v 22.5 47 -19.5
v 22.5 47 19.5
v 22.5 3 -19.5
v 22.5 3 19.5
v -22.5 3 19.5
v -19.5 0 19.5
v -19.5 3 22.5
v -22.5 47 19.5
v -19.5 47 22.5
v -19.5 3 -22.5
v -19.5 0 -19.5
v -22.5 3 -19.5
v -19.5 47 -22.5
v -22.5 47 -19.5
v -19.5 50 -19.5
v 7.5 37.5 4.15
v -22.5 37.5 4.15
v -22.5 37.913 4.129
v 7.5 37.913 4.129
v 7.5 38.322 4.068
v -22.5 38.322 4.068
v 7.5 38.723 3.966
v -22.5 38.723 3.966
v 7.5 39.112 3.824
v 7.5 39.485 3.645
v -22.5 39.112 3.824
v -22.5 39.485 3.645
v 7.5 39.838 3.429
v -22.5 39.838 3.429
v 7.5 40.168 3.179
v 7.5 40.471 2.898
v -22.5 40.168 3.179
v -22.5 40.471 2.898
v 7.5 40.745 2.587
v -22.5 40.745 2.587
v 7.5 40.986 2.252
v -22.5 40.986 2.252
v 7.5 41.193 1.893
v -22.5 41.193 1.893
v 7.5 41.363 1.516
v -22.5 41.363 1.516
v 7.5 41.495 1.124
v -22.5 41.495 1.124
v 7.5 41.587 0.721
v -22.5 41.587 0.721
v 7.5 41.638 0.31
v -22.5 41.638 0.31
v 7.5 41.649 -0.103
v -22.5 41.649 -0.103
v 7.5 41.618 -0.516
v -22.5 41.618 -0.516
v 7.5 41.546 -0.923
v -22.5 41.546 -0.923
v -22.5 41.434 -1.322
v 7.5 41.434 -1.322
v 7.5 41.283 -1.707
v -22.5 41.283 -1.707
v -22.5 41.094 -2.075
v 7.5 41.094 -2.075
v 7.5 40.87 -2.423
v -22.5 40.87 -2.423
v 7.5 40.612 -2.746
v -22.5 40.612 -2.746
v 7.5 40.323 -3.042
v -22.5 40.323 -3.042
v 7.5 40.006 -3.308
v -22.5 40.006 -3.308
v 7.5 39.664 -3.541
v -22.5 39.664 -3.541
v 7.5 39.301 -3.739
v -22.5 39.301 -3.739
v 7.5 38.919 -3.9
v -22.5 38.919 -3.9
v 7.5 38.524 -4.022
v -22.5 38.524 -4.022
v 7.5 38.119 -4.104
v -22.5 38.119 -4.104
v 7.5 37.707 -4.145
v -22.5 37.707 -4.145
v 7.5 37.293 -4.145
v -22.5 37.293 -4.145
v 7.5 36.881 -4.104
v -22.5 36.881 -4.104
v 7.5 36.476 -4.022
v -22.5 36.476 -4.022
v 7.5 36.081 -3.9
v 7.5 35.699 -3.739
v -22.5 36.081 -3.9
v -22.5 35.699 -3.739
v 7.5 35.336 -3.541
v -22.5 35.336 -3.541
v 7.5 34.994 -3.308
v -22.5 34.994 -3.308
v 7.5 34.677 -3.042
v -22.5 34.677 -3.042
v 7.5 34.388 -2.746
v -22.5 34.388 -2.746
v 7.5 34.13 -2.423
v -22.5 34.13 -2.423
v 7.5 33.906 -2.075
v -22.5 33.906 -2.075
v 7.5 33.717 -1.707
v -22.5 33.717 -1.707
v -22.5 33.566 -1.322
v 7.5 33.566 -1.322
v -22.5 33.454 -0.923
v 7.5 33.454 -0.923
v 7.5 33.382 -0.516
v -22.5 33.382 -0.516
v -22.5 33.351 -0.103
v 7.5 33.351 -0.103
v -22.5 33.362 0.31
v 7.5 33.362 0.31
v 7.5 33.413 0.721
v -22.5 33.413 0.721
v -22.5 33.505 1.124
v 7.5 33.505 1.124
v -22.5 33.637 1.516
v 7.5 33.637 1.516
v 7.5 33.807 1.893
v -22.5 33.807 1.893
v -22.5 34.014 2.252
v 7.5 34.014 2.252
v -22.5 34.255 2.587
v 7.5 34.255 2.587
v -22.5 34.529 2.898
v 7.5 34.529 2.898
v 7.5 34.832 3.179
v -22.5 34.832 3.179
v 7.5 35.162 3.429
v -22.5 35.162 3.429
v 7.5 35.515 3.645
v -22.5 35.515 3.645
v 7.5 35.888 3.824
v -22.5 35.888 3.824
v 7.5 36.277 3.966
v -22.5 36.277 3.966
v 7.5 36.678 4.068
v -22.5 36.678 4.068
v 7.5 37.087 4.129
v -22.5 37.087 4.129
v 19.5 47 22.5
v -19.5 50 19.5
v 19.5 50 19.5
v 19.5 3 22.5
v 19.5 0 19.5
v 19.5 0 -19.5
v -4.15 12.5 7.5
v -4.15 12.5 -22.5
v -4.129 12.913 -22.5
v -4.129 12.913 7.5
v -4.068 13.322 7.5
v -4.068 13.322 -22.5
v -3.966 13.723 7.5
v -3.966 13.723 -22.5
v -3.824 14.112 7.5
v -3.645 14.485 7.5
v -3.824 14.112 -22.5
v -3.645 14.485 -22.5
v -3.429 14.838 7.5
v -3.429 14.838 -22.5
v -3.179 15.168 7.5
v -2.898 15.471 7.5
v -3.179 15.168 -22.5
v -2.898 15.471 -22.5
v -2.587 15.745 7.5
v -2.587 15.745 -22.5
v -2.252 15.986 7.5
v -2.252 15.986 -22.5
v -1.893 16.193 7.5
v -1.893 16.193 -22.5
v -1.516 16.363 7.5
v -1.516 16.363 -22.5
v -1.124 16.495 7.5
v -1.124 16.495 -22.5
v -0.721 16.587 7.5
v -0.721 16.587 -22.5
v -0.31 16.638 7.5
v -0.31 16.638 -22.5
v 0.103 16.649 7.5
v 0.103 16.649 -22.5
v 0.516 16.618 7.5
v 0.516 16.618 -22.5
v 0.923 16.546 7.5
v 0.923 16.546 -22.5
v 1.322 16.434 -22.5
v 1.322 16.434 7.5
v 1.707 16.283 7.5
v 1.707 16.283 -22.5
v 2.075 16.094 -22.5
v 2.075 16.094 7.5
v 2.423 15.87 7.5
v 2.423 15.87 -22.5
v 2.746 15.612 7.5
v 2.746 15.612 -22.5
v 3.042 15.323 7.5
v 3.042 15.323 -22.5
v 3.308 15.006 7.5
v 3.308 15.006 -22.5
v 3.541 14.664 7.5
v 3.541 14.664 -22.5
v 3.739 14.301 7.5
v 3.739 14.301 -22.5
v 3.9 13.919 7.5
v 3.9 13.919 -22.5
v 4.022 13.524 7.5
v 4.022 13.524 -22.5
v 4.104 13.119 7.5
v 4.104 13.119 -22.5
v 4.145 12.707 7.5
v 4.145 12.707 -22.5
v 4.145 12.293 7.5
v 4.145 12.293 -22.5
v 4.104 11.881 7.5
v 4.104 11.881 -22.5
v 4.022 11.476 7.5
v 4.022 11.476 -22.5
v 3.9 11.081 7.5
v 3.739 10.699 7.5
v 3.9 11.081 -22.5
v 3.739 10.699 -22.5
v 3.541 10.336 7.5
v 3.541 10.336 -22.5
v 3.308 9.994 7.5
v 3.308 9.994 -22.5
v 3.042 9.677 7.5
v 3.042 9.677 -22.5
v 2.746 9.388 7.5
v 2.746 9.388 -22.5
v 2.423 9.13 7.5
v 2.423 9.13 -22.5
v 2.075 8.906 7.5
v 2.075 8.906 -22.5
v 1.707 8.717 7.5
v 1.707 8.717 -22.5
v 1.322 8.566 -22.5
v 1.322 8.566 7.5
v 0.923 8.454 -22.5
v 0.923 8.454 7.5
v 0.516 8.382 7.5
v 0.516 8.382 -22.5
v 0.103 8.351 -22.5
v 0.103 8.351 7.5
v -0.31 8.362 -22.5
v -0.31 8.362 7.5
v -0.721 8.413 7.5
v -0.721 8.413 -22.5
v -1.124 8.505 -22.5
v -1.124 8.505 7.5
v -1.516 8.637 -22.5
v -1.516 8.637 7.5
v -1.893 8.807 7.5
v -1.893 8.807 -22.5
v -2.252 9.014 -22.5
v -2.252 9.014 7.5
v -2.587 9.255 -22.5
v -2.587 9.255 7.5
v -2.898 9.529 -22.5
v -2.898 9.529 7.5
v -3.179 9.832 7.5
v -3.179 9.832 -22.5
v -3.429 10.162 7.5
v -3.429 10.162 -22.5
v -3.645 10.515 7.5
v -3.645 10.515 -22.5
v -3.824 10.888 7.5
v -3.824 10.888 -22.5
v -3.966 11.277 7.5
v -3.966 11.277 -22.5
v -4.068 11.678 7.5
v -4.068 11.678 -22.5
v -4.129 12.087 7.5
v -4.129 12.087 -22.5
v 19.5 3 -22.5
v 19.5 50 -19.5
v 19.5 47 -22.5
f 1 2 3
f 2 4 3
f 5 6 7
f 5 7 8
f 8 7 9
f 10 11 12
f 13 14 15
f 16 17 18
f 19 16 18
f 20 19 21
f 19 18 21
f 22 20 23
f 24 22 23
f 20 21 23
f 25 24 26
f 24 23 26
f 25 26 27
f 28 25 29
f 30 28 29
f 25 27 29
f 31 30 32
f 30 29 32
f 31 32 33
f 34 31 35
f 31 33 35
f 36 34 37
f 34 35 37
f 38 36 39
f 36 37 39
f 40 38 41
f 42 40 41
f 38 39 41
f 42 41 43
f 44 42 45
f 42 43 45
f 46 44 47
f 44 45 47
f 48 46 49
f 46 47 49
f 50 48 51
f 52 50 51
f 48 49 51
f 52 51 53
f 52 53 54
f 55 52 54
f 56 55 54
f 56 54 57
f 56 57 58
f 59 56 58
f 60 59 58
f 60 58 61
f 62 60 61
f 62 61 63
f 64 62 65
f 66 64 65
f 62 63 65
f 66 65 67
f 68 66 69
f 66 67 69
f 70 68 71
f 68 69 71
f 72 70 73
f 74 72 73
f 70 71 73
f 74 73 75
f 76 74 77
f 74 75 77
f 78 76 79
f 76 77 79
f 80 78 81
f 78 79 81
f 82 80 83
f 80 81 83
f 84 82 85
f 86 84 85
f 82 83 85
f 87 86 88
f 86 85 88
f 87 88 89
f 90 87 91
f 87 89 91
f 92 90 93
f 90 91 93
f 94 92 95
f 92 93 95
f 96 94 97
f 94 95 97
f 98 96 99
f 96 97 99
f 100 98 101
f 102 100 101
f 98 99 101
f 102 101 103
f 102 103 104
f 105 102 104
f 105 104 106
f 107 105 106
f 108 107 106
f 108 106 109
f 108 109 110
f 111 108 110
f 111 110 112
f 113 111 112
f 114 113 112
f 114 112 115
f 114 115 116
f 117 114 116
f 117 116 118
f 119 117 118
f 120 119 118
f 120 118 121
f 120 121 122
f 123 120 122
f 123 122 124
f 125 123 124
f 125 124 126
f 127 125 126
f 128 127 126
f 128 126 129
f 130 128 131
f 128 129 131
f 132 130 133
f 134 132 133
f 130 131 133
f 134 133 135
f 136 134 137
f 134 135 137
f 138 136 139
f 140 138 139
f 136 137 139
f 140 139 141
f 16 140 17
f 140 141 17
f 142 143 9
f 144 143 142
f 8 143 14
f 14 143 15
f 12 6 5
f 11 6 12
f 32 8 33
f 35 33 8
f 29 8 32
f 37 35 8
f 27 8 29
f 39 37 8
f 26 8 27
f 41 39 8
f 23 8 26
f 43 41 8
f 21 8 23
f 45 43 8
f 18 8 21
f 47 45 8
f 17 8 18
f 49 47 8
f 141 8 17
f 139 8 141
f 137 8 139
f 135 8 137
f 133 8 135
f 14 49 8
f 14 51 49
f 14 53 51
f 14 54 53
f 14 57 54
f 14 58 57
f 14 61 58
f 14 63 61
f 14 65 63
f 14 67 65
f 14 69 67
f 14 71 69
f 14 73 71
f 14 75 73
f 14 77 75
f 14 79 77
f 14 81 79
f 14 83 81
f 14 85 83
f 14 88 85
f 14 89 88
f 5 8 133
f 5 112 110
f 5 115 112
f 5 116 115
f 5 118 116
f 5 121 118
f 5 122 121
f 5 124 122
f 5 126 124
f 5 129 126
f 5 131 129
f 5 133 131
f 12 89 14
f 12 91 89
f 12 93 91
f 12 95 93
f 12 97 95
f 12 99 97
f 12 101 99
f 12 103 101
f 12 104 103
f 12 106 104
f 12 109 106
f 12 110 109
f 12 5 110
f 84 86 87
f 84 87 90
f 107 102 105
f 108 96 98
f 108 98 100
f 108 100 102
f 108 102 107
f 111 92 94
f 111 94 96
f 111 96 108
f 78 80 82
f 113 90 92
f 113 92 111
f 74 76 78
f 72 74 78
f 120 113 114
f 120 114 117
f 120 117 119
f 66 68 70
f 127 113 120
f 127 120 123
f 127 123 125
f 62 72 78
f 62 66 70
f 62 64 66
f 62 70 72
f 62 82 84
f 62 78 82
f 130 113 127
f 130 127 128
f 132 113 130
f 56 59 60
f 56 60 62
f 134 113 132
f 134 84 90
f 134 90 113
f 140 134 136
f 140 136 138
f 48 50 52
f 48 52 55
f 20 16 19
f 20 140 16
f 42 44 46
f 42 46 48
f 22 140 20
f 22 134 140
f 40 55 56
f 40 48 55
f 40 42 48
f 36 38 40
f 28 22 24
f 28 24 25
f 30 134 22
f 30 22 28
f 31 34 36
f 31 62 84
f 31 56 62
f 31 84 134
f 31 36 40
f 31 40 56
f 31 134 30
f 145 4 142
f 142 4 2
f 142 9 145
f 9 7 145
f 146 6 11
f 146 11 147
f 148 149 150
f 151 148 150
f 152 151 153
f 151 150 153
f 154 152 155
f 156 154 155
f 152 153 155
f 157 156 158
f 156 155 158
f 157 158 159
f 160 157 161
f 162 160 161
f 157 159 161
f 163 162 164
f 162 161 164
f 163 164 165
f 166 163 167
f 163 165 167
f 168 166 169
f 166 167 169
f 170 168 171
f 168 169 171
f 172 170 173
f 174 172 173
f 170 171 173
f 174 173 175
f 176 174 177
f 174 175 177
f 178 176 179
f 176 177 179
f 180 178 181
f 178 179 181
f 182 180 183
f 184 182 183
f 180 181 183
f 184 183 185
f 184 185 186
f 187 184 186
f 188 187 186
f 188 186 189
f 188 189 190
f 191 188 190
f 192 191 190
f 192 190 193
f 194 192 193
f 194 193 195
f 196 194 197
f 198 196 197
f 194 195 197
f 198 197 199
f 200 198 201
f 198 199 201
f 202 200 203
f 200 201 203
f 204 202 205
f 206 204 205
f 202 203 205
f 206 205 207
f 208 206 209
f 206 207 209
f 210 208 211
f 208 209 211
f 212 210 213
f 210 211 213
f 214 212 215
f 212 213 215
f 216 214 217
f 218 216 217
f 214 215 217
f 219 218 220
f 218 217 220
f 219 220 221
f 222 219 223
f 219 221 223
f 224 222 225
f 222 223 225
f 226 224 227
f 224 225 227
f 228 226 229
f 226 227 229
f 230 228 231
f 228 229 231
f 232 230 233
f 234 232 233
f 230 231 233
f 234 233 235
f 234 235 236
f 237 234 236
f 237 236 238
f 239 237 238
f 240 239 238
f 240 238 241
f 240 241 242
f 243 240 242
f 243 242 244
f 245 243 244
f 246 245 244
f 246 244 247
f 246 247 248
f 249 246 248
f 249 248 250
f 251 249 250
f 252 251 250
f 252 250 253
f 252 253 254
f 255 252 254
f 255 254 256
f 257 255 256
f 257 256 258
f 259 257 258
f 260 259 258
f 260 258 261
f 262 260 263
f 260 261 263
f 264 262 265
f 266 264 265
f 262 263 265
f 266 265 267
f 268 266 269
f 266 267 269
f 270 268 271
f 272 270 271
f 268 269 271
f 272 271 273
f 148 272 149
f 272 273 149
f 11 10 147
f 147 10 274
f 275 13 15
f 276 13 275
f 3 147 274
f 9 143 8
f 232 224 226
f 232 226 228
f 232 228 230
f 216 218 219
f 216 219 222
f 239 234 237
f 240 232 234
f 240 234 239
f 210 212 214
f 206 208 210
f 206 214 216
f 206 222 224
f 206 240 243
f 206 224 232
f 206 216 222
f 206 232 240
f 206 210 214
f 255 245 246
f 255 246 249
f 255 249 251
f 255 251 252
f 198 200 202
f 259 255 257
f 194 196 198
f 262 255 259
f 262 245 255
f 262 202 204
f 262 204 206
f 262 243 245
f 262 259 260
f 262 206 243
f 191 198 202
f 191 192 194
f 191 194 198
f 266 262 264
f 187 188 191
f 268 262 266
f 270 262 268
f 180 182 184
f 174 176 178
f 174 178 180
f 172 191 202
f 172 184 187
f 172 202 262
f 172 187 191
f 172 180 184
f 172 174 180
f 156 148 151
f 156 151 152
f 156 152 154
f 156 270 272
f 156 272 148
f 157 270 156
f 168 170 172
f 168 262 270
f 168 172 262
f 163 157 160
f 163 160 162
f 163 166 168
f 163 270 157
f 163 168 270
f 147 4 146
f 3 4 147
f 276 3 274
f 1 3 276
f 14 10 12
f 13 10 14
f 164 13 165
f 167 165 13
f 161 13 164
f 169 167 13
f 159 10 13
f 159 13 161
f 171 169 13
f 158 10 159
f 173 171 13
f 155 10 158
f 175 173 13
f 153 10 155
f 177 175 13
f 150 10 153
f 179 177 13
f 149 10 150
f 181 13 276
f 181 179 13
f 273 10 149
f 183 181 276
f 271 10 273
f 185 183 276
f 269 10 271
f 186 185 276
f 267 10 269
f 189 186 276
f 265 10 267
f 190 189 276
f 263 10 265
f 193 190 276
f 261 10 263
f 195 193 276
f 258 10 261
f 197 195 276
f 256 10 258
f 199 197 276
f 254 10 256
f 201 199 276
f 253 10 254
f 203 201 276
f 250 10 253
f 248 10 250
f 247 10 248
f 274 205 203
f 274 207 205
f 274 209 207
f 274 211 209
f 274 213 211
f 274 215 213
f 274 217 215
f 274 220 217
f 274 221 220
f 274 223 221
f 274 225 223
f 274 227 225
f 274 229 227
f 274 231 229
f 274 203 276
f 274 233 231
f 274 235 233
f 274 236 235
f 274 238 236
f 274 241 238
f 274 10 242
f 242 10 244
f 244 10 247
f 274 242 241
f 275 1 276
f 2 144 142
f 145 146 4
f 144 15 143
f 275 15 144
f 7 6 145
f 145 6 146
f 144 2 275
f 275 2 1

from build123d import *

# Parameters (mm, degrees)
SKETCH1_W           = 45
SKETCH1_H           = 45
BOSS_EXTRUDE1_DEPTH = 50
SKETCH2_R           = 4.15
CUT_EXTRUDE1_DEPTH  = 30
SKETCH3_R           = 4.15
CUT_EXTRUDE2_DEPTH  = 30
CHAMFER1_SIZE       = 3


with BuildPart() as part:
    # Sketch1 → Boss-Extrude1 (new body)
    with BuildSketch(Plane(origin=(0, 0, 0), x_dir=(1, 0, 0), z_dir=(0, 1, 0))):
        Rectangle(SKETCH1_W, SKETCH1_H)
    extrude(amount=BOSS_EXTRUDE1_DEPTH)

    # Sketch2 → Cut-Extrude1 (cut)
    with BuildSketch(Plane(origin=(0, 0, -22.5), x_dir=(-1, 0, 0), z_dir=(0, 0, -1))):
        with Locations((0, 12.5)):
            Circle(SKETCH2_R)
    extrude(amount=-CUT_EXTRUDE1_DEPTH, mode=Mode.SUBTRACT)

    # Sketch3 → Cut-Extrude2 (cut)
    with BuildSketch(Plane.ZY.offset(22.5)):
        with Locations((0, 37.5)):
            Circle(SKETCH3_R)
    extrude(amount=-CUT_EXTRUDE2_DEPTH, mode=Mode.SUBTRACT)

    # Chamfer1
    chamfer1_edges = [part.edges().sort_by_distance(p)[0] for p in [
        (-22.5, 50, 0),
        (0, 50, 22.5),
        (22.5, 50, 0),
        (0, 0, 22.5),
        (-22.5, 0, 0),
        (0, 0, -22.5),
        (22.5, 0, 0),
        (22.5, 25, 22.5),
        (-22.5, 25, 22.5),
        (-22.5, 25, -22.5),
        (22.5, 25, -22.5),
        (0, 50, -22.5),
    ]]
    chamfer(chamfer1_edges, length=CHAMFER1_SIZE)


solid = part.part
